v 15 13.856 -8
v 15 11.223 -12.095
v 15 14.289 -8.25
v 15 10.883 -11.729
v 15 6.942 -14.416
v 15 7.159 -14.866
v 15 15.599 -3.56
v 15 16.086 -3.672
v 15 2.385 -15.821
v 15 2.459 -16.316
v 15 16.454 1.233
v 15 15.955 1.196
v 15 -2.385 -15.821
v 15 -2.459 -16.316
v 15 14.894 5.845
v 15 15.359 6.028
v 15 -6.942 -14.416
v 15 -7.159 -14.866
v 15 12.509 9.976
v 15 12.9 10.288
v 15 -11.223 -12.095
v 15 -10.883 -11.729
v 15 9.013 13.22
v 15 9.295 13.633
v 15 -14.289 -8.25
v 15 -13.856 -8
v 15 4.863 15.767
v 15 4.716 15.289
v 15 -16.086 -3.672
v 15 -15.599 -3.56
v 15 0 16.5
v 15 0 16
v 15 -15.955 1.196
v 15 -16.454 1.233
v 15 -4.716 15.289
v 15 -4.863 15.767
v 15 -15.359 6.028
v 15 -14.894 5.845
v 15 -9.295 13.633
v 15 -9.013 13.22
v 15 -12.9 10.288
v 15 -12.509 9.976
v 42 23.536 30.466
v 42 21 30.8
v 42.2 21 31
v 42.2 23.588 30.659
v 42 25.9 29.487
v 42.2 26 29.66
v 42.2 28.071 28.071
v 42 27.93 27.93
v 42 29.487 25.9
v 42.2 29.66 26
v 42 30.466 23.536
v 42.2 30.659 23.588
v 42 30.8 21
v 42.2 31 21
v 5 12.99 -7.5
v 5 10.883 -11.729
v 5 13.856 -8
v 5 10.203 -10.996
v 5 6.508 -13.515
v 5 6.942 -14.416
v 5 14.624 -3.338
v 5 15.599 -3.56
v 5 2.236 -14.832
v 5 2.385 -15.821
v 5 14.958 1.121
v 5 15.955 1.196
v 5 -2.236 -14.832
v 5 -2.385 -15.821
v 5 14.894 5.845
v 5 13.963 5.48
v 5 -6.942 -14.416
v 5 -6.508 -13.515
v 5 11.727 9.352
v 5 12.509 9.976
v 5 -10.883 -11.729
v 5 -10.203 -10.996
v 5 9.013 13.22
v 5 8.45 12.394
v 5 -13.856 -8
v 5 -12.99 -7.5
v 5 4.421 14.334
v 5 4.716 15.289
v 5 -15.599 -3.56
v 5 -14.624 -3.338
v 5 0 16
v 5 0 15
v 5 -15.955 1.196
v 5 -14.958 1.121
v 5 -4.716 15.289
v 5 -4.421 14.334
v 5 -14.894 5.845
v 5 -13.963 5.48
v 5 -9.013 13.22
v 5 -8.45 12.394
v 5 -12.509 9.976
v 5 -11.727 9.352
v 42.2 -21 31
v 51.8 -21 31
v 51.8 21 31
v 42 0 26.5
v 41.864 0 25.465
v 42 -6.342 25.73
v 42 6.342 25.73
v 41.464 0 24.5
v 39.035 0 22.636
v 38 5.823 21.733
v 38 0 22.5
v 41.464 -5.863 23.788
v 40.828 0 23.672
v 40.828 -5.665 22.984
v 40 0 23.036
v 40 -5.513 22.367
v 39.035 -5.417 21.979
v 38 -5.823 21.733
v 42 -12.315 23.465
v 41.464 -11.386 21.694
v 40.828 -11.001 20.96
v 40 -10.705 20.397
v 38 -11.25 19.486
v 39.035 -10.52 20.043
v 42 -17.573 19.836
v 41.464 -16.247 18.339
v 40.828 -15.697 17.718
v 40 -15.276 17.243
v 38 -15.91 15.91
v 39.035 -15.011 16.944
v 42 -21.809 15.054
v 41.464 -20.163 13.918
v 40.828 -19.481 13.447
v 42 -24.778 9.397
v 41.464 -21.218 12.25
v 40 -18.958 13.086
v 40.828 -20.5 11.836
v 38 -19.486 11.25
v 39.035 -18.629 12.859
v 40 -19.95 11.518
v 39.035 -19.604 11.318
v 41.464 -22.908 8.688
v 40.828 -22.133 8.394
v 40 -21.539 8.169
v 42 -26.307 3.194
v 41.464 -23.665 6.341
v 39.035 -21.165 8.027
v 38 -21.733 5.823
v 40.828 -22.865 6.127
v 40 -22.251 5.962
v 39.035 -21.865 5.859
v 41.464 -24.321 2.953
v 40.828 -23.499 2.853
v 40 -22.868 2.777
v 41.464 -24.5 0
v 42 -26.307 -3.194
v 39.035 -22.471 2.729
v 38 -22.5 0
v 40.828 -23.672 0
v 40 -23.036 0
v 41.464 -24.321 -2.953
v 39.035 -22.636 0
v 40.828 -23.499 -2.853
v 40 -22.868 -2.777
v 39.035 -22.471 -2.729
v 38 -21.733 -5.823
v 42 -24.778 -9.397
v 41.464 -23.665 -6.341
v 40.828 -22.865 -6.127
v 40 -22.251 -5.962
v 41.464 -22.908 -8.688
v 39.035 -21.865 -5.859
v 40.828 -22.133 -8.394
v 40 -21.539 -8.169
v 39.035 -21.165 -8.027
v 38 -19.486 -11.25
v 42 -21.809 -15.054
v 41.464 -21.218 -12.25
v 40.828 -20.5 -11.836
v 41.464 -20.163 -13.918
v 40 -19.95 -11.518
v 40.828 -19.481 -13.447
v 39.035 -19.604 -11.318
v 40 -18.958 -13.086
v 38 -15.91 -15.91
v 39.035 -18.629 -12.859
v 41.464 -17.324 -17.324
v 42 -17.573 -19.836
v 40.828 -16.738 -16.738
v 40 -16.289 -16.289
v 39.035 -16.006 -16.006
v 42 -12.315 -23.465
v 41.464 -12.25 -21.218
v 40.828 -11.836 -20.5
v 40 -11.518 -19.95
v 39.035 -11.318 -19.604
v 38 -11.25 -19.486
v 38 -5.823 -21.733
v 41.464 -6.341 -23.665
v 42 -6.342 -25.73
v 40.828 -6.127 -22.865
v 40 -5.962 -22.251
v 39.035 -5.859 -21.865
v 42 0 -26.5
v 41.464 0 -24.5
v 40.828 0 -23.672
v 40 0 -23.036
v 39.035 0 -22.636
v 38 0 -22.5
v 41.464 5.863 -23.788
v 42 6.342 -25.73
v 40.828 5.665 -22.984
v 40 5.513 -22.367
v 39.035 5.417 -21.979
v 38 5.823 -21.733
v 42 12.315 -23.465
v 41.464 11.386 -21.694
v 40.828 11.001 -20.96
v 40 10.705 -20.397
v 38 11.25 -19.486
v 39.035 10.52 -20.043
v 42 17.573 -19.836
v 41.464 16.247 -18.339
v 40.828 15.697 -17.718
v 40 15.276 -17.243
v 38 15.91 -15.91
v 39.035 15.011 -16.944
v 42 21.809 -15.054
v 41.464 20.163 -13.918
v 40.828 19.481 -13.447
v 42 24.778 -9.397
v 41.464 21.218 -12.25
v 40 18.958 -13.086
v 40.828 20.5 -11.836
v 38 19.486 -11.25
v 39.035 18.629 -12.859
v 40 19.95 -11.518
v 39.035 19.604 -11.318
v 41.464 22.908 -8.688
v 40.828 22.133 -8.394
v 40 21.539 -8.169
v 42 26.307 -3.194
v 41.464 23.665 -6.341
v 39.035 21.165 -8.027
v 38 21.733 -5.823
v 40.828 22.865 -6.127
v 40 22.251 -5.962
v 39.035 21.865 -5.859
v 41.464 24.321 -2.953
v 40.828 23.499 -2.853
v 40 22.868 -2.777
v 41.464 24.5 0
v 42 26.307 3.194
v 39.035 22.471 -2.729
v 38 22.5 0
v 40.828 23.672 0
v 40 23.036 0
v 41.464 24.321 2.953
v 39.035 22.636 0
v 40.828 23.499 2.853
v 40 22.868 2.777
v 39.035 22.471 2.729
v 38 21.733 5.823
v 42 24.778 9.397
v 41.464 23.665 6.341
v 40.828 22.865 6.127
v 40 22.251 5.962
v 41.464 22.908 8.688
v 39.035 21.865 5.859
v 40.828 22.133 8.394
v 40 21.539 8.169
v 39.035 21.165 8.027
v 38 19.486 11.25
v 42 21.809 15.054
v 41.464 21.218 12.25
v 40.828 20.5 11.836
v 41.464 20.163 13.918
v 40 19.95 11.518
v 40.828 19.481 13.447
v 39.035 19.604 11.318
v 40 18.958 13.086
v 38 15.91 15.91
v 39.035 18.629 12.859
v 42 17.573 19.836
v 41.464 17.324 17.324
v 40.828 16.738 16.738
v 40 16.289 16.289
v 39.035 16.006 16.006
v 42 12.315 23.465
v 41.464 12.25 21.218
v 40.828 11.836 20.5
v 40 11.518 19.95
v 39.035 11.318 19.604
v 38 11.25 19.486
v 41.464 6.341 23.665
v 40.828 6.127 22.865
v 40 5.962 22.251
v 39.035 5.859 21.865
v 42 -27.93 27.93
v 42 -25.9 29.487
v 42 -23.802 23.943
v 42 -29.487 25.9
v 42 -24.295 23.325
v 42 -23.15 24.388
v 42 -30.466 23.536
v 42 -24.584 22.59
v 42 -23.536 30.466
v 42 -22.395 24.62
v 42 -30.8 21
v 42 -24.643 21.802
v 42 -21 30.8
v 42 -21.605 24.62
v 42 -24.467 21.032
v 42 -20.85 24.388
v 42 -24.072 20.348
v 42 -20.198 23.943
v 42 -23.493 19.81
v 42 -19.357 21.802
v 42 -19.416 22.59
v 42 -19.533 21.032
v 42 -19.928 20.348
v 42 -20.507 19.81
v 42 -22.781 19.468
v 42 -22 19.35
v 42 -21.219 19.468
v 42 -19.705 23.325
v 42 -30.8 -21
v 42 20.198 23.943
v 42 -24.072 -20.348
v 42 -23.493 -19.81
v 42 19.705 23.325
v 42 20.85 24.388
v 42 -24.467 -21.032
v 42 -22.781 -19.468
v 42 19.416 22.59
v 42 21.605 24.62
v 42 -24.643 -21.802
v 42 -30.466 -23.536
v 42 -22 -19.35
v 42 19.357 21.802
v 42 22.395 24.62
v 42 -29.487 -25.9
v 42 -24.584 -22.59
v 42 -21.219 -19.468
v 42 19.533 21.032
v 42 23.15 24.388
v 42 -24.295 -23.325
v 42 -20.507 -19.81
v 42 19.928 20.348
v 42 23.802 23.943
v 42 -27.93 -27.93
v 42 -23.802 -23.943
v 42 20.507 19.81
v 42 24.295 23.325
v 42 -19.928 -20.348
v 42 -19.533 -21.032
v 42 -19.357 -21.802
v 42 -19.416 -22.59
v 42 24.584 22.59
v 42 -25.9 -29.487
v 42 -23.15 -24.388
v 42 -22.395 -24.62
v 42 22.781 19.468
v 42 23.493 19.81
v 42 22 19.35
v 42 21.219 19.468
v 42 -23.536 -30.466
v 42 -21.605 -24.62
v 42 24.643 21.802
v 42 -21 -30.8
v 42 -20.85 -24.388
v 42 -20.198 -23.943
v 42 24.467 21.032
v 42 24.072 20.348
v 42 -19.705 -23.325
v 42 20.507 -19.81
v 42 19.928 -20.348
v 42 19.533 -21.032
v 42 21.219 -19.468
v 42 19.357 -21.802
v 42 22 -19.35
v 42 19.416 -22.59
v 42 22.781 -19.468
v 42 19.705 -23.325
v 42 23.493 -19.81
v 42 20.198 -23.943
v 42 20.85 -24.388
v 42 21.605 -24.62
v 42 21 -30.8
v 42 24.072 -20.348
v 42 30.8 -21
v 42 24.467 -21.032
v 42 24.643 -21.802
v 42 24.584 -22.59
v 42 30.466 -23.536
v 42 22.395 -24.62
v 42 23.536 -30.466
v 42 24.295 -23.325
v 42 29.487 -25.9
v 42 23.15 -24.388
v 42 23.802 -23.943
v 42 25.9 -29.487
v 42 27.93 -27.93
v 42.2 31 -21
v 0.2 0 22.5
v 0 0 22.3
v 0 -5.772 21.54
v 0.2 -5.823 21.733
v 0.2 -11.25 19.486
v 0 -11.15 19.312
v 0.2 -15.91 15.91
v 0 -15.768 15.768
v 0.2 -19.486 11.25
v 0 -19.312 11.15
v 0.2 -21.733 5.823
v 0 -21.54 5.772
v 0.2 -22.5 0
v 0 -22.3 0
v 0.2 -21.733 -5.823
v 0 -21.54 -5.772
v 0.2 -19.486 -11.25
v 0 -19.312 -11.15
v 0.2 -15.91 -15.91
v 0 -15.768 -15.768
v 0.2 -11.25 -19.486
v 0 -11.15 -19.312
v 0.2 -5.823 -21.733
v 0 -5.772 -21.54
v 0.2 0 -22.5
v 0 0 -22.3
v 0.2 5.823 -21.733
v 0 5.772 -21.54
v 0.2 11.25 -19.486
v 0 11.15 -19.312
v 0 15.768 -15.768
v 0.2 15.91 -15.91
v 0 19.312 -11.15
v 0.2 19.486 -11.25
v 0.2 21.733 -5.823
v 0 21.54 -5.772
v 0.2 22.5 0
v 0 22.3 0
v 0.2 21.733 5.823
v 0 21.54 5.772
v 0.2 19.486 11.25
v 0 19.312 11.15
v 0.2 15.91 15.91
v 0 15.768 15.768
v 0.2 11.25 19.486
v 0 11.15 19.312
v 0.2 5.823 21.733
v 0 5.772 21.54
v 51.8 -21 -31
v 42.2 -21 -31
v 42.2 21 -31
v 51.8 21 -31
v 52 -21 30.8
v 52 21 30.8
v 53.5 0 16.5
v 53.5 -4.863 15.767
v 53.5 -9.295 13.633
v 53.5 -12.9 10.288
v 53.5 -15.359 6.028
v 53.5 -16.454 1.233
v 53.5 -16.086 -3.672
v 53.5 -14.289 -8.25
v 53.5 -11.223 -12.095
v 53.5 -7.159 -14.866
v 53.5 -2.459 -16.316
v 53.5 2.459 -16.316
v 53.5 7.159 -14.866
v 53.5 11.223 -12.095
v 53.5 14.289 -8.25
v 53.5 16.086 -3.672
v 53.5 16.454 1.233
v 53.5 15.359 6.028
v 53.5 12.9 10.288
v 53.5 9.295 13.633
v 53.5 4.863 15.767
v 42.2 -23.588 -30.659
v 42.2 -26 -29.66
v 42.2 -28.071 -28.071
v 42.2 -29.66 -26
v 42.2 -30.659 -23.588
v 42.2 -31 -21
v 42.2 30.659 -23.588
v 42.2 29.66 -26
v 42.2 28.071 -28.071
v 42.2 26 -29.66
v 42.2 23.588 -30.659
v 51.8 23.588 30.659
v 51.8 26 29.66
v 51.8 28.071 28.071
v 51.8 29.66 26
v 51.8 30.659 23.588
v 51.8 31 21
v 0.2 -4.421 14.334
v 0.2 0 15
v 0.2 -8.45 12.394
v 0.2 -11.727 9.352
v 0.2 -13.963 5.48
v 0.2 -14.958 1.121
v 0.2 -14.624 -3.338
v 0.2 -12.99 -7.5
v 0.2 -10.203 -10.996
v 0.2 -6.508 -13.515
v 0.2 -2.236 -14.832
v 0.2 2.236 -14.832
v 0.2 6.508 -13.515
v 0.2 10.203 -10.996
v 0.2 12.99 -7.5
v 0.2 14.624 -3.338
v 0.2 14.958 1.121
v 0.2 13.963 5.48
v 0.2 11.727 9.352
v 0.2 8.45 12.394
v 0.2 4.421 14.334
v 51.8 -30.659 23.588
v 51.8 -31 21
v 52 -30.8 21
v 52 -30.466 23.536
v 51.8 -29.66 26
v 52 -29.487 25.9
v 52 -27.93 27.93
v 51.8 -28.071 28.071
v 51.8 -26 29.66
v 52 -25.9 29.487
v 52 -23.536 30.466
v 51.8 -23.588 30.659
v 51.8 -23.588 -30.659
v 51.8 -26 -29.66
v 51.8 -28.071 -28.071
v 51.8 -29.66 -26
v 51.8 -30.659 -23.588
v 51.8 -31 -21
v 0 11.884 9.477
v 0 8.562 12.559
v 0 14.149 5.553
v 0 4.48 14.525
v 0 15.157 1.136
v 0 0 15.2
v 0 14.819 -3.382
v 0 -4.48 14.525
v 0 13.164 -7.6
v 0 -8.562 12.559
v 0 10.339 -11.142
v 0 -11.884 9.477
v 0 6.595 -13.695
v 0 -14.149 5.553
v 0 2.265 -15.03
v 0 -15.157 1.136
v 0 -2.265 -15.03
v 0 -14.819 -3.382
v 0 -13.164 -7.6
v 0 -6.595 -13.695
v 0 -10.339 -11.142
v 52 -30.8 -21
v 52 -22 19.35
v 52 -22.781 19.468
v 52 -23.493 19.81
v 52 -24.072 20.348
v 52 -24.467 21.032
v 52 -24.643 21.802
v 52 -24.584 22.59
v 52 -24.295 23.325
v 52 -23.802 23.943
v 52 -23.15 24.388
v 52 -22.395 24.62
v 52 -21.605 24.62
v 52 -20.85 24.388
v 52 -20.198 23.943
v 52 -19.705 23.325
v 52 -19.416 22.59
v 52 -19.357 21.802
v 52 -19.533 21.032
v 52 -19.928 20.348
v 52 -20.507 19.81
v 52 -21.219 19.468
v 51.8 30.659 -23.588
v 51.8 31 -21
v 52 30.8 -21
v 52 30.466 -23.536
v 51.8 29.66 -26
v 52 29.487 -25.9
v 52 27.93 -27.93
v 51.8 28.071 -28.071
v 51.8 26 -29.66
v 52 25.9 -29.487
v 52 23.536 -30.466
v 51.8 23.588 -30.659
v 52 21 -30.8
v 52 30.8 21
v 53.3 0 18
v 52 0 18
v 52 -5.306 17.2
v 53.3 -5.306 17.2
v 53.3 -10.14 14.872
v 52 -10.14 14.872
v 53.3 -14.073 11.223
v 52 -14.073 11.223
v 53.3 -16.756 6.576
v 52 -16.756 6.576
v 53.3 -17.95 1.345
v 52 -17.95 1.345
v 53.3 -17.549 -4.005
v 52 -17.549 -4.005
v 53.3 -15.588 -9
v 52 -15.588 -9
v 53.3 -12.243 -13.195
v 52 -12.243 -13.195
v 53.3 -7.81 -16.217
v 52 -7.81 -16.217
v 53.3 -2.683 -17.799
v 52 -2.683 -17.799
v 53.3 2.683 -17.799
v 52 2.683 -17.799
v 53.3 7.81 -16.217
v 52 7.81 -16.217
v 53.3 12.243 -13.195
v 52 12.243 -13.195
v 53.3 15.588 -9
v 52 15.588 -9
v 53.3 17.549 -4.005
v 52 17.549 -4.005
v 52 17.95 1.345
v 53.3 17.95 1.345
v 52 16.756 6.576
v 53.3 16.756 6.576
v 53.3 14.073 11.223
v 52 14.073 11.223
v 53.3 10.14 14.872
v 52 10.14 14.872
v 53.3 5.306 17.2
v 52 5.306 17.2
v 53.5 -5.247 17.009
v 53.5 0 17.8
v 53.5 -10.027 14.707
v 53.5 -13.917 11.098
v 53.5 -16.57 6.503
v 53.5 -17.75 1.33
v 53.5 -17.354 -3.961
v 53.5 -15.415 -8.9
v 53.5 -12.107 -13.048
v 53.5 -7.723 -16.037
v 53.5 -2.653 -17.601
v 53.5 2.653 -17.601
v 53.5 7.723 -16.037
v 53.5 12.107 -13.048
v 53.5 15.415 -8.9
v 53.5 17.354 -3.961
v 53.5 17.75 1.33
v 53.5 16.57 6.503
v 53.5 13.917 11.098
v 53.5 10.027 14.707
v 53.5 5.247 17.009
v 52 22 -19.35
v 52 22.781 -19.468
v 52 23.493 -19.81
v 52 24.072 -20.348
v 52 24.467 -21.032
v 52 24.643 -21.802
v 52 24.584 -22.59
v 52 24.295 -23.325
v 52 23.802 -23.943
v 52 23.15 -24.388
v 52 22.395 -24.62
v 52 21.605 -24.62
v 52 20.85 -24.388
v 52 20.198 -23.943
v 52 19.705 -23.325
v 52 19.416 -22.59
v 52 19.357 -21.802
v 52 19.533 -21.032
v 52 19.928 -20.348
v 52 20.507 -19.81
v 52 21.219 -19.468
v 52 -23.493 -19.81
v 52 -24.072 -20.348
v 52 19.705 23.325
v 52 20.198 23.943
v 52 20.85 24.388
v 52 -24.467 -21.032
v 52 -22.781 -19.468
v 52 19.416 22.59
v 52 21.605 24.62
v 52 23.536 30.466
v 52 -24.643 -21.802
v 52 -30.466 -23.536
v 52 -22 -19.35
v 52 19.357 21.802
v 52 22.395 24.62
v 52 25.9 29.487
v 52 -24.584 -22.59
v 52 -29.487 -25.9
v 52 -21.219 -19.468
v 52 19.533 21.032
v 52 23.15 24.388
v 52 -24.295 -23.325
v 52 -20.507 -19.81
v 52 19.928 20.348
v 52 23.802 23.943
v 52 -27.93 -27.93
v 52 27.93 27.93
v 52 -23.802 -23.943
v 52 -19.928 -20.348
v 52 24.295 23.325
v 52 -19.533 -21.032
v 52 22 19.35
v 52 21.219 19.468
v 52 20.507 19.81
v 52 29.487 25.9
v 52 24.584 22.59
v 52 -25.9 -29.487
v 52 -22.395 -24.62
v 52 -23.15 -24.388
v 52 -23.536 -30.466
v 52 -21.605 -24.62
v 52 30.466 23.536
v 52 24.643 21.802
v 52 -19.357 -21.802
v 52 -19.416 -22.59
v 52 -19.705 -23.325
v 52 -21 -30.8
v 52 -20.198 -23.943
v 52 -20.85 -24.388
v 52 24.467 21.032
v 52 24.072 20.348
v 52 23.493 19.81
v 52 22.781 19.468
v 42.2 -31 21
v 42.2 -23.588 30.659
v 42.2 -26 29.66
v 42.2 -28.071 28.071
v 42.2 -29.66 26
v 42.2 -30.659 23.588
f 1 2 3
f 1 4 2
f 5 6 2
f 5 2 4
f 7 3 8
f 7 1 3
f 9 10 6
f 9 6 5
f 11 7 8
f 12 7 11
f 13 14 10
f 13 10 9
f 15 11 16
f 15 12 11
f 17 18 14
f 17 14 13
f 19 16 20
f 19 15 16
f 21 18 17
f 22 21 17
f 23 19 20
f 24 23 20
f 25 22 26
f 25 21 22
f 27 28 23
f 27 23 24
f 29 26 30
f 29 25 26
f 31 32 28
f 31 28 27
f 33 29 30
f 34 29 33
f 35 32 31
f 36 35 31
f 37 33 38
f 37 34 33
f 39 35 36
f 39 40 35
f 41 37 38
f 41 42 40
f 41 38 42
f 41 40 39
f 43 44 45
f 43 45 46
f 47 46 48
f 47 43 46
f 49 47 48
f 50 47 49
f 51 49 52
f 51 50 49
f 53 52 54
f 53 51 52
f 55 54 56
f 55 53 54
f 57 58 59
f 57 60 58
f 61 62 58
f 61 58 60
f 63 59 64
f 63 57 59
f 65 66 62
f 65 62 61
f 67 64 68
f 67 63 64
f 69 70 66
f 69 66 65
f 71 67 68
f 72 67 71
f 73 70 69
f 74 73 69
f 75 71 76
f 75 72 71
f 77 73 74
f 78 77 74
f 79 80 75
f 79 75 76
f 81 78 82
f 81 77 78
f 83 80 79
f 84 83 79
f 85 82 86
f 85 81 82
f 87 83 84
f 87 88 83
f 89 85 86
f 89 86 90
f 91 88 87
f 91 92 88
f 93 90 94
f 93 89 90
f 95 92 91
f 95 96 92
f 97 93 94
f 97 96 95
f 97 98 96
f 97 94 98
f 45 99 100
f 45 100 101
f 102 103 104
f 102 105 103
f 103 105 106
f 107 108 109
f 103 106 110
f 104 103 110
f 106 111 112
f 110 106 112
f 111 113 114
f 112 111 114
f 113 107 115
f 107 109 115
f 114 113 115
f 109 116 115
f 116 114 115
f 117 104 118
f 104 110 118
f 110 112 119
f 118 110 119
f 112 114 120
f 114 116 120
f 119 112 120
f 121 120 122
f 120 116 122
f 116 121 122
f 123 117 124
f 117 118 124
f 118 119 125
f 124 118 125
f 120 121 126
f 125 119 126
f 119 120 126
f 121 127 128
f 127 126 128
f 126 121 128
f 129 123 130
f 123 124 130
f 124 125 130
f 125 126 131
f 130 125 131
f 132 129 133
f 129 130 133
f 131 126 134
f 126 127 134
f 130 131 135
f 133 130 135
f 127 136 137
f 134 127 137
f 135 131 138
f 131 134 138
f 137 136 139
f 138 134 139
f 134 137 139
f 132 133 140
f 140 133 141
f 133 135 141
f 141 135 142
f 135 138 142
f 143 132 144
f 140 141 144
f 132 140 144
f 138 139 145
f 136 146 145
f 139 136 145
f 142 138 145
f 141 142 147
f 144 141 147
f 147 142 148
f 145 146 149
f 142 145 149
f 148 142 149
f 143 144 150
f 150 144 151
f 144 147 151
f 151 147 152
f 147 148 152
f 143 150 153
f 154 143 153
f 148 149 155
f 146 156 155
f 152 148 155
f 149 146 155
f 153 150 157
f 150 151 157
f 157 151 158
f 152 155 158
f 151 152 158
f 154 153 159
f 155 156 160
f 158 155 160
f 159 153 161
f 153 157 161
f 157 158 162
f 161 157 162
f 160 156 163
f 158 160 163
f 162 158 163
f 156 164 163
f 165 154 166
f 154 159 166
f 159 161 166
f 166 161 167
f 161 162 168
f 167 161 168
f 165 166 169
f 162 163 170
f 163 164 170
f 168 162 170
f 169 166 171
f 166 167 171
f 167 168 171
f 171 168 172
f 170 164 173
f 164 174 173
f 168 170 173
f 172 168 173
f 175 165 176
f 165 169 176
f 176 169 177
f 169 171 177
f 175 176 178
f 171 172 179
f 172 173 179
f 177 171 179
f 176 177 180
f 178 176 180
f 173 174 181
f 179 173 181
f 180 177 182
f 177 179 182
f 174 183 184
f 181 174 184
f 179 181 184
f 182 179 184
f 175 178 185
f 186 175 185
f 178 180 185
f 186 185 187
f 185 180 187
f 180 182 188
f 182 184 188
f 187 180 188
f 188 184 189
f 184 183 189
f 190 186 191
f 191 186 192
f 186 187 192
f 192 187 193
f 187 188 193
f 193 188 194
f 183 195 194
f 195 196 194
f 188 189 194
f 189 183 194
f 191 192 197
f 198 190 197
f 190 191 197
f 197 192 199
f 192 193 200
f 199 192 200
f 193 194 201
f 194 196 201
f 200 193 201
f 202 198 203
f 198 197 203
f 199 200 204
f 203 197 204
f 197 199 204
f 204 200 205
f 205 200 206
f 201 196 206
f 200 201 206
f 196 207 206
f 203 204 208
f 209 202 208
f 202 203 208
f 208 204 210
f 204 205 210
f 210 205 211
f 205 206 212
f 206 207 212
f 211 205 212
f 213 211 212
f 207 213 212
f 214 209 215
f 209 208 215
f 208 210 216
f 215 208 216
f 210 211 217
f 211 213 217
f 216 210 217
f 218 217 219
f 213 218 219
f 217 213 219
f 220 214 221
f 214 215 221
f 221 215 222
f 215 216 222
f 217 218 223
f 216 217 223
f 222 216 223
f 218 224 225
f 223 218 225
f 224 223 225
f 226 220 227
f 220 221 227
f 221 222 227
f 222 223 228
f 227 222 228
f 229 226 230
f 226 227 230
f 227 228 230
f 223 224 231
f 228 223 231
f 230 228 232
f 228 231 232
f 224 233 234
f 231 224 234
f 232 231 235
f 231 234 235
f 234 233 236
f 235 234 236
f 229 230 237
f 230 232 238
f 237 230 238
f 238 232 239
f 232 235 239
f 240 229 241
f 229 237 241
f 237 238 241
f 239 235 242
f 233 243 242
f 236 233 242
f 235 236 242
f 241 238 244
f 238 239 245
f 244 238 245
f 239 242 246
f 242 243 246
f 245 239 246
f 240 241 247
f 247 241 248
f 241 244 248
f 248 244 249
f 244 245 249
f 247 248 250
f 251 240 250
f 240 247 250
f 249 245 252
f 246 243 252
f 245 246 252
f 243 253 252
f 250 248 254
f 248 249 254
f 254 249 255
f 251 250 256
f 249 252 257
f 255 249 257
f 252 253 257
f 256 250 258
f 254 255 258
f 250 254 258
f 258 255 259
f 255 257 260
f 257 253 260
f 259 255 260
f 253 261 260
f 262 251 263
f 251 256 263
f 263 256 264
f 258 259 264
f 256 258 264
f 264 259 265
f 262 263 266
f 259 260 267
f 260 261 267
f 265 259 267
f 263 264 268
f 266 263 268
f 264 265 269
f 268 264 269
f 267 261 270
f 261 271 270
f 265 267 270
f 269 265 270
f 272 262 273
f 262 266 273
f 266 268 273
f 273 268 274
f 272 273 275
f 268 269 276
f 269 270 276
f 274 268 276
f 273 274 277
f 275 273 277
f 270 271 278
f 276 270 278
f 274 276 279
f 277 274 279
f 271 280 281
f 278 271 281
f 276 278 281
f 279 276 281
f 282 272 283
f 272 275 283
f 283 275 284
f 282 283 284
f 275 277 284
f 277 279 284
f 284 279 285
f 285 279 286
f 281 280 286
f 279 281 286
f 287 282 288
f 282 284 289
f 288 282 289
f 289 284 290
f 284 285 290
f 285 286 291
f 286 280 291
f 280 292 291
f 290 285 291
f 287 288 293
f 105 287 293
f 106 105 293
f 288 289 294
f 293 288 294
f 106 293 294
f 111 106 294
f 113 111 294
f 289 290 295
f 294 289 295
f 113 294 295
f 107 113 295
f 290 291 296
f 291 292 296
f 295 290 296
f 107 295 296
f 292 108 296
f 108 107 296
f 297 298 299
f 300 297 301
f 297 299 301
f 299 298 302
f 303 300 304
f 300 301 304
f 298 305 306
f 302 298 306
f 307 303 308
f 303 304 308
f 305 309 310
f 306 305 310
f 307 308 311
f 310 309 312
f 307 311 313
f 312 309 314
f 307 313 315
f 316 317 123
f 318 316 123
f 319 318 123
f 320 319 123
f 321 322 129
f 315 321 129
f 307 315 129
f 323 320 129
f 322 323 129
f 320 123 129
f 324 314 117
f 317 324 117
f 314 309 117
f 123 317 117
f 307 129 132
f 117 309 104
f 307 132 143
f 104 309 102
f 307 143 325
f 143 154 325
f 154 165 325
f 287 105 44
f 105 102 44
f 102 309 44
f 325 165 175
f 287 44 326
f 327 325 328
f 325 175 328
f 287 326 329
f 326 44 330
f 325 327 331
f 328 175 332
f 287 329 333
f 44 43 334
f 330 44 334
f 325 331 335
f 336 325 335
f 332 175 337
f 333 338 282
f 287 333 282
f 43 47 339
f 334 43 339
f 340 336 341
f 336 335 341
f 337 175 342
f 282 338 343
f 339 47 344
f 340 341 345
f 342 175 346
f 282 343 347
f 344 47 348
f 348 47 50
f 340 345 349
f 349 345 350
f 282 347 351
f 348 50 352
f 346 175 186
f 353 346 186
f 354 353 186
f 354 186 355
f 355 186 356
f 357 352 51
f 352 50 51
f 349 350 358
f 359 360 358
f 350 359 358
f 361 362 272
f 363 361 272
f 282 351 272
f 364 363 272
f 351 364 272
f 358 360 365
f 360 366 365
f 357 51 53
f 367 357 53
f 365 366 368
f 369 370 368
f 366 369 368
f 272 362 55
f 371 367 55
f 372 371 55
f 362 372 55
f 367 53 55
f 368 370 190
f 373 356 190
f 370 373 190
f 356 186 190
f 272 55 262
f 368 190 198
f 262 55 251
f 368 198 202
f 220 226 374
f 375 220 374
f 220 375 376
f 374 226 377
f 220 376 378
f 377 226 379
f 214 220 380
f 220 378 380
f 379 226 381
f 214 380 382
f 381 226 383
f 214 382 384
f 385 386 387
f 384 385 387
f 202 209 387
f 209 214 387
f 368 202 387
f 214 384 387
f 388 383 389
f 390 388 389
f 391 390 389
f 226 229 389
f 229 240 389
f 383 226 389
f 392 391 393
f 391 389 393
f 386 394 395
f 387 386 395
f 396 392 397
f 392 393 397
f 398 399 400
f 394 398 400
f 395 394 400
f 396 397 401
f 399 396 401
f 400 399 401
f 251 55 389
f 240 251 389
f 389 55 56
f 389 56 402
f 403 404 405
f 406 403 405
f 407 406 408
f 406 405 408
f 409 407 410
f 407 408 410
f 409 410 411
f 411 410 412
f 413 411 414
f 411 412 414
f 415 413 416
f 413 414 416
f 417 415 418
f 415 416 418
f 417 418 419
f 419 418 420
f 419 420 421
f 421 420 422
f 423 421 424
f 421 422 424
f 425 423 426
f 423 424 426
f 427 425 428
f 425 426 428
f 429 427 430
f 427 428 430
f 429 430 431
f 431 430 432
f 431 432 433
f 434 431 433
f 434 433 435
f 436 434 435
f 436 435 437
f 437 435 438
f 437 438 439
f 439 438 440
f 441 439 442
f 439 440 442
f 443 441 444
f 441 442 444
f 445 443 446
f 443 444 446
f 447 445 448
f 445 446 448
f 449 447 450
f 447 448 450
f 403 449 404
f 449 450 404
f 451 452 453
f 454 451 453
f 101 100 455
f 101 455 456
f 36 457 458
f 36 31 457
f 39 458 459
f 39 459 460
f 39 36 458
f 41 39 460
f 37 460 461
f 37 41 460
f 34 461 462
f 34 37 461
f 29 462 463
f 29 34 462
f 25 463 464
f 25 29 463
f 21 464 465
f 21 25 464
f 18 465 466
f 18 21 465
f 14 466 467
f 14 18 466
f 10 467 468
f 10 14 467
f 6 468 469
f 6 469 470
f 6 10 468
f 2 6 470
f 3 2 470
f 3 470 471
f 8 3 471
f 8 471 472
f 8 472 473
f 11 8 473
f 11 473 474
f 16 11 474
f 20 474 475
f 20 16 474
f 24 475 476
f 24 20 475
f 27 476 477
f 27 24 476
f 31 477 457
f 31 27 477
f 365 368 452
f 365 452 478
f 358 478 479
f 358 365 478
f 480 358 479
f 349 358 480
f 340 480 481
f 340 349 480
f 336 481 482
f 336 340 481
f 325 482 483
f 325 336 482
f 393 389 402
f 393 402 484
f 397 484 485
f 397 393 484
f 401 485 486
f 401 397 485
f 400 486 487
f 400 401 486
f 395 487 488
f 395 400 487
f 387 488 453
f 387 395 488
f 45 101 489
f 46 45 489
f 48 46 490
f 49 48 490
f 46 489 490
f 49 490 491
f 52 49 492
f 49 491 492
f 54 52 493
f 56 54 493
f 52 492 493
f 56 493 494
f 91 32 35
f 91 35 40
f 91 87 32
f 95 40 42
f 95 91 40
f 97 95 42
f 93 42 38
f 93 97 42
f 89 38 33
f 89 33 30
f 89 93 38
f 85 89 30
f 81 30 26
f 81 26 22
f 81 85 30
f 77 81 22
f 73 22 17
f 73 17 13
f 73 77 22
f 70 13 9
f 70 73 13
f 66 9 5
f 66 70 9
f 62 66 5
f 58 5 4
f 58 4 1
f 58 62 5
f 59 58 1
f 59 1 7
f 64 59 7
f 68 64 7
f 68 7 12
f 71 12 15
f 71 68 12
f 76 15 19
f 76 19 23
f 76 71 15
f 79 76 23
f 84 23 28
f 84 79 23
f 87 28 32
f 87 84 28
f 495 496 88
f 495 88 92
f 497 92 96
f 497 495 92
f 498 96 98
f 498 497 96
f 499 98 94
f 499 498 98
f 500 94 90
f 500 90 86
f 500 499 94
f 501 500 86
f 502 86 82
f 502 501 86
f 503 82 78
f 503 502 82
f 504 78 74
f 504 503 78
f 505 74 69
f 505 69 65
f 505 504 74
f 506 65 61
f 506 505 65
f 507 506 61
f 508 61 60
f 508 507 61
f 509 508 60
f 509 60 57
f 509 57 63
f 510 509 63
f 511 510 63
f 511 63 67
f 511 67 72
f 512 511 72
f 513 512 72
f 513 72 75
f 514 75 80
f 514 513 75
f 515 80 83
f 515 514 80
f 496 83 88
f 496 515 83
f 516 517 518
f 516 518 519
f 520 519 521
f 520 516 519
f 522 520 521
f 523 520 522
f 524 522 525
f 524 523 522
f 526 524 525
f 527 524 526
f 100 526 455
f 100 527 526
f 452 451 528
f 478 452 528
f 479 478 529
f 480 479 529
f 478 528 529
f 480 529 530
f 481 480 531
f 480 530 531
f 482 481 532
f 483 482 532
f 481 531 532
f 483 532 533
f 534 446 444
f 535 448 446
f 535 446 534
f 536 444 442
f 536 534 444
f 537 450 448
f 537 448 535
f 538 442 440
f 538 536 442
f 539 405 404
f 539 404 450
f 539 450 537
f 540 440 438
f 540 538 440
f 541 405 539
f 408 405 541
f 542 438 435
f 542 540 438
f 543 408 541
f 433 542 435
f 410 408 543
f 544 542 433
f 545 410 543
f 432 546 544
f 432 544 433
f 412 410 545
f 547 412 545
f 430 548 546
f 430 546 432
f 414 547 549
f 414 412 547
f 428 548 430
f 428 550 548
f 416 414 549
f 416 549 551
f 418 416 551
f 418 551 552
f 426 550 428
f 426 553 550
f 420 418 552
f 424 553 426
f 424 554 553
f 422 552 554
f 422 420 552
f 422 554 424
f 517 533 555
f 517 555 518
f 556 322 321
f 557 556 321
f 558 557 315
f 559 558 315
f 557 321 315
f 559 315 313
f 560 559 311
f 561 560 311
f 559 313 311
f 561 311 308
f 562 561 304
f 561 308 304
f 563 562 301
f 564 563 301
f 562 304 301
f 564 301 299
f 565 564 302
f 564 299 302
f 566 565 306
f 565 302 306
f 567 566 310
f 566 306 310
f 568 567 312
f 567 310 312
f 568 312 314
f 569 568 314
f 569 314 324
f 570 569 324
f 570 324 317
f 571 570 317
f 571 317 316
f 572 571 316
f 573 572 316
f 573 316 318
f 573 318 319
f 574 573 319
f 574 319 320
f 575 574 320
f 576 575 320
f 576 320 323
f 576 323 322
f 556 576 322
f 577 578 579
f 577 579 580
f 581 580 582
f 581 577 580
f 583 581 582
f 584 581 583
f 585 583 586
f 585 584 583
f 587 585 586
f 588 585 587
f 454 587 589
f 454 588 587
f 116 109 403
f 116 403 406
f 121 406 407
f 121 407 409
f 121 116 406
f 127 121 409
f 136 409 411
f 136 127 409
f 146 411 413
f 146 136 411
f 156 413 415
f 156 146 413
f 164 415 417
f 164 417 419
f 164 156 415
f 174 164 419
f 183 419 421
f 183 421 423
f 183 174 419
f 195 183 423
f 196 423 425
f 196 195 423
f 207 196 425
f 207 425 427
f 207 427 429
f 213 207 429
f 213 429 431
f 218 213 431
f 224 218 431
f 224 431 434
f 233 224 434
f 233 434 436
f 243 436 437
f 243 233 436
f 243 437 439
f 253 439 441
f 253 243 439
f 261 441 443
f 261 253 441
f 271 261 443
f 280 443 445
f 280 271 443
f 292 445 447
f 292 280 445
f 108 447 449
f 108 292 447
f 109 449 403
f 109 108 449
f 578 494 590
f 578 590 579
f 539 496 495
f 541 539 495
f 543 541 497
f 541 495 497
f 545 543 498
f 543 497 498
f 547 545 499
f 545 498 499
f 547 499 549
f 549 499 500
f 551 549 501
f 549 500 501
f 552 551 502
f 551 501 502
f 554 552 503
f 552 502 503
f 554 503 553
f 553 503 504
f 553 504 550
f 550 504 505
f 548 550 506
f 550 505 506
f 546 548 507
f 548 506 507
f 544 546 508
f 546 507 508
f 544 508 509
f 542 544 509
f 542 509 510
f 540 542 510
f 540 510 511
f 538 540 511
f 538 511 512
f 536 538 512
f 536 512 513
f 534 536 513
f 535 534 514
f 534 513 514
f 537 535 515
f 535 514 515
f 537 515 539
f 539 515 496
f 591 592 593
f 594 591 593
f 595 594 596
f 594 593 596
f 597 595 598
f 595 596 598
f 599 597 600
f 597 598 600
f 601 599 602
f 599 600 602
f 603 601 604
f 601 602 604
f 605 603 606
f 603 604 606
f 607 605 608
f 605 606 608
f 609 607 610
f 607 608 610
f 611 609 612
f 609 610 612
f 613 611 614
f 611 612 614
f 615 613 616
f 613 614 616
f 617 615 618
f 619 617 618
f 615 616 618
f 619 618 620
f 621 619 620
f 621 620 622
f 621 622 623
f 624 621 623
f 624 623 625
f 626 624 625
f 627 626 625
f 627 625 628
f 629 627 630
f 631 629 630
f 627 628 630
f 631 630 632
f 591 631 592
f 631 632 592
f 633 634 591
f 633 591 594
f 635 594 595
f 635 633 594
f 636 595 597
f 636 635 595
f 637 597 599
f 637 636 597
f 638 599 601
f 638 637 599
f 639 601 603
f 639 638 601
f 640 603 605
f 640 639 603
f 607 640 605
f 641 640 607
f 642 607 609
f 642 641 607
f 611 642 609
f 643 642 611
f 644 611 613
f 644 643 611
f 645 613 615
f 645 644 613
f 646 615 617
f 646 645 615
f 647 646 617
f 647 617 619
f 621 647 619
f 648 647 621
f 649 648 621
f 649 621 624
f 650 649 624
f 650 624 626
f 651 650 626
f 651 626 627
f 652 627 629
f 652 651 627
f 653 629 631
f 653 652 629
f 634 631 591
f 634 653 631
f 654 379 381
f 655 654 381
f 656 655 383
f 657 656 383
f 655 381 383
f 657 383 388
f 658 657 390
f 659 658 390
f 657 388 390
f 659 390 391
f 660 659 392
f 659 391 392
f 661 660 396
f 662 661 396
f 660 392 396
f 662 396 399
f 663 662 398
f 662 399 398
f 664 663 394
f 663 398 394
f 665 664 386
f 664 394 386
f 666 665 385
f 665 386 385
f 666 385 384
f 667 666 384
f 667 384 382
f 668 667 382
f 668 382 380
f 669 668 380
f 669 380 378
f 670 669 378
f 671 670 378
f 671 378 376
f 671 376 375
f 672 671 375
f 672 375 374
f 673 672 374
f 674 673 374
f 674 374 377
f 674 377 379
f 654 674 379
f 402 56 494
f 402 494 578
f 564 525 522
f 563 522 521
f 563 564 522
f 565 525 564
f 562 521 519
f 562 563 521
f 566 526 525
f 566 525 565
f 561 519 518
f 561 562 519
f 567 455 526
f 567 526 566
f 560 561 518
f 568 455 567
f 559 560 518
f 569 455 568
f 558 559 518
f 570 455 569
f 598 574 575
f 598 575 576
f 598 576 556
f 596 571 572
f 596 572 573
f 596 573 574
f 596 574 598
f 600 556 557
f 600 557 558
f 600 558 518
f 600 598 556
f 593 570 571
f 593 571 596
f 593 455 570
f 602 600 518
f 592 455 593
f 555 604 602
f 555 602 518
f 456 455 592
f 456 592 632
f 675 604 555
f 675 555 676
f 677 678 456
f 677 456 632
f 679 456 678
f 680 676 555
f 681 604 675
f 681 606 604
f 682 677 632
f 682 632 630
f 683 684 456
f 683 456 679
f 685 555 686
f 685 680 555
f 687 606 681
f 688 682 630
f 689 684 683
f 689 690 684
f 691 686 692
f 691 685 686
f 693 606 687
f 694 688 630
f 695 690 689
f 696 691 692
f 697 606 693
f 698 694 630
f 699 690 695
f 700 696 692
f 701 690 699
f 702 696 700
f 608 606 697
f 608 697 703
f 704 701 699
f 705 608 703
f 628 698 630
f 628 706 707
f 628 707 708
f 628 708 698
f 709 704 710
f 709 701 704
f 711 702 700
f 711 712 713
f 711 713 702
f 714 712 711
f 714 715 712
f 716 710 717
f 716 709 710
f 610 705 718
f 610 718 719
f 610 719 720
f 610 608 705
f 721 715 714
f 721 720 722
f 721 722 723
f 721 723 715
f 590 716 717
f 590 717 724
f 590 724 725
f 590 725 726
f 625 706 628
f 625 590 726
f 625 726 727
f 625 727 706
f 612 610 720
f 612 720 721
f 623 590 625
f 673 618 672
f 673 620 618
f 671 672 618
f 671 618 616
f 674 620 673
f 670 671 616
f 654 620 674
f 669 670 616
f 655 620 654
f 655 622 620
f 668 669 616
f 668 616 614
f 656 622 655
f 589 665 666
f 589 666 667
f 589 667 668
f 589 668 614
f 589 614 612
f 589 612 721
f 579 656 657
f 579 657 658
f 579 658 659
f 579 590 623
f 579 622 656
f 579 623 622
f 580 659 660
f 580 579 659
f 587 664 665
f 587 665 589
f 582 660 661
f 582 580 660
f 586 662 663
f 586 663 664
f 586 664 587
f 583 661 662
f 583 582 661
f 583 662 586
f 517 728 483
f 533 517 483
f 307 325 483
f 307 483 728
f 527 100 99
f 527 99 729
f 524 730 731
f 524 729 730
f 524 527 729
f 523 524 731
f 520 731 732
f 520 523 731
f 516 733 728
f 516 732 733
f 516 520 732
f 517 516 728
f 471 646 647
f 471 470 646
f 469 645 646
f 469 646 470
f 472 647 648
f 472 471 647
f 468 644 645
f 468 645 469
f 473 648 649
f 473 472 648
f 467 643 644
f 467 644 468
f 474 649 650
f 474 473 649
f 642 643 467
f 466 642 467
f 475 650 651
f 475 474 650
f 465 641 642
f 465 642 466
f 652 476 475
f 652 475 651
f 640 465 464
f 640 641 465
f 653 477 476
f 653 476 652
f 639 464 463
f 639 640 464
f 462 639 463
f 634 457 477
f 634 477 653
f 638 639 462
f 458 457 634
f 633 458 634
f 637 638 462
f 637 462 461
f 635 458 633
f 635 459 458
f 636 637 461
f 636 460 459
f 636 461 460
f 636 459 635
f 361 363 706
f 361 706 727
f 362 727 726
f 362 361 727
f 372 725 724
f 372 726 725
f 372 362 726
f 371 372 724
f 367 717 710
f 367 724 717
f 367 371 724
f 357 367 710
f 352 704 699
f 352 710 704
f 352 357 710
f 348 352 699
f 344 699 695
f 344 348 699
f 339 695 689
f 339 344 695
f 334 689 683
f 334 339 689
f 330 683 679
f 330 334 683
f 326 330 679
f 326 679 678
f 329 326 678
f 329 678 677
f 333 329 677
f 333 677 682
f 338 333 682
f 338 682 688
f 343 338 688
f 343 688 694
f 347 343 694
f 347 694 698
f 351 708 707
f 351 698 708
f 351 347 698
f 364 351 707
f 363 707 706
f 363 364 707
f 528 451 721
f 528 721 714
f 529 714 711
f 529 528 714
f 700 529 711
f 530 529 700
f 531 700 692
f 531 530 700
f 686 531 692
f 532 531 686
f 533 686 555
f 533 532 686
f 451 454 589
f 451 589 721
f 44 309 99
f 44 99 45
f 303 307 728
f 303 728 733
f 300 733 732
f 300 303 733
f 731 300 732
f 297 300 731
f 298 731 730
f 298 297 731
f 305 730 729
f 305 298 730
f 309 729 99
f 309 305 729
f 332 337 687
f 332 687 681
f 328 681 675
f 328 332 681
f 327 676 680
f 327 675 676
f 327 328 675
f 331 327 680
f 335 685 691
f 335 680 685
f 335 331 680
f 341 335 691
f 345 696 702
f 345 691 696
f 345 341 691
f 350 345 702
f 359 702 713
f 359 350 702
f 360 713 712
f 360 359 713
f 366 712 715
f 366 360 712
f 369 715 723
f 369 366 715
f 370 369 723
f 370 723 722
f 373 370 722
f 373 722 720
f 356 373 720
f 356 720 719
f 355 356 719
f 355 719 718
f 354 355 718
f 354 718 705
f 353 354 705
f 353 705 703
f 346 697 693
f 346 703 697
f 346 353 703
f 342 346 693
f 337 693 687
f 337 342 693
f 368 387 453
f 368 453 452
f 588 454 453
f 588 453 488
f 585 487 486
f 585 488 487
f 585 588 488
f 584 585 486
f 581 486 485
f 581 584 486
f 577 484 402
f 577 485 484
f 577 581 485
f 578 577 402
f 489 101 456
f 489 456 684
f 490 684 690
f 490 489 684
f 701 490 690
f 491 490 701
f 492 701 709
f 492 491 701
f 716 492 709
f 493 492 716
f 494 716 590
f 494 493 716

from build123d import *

# Parameters (mm, degrees)
BOSS_EXTRU_1_START = -10
ESQUISSE2_W        = 62
ESQUISSE2_H        = 62
ESQUISSE2_R        = 16.5
BOSS_EXTRU_1_DEPTH = 10
CONG_1_R           = 10
D_GAGEMENT_M51_D   = 5.3
SYM_TRIE2_COPY_1_D = 5.3
CONG_2_R           = 4
ESQUISSE5_R        = 18
ESQUISSE5_R_2      = 16.5
BOSS_EXTRU_2_DEPTH = 1.5
CHANFREIN1_SIZE    = 0.2
CHANFREIN2_SIZE    = 0.2
CHANFREIN3_SIZE    = 0.2
CHANFREIN4_SIZE    = 0.2


with BuildPart() as part:
    # Esquisse1 → Révolution1 (revolve)
    with BuildSketch(Plane.XY, mode=Mode.PRIVATE) as r_volution1_sk:
        Polygon((0, 15), (0, 22.5), (52, 22.5), (52, 16.5), (15, 16.5), (15, 16), (5, 16), (5, 15), align=None)
    revolve(r_volution1_sk.sketch.rotate(Axis((-138.831140815, 0, 0), (1, 0, 0)), 90), axis=Axis((-138.831140815, 0, 0), (1, 0, 0)))

    # Esquisse2 → Boss.-Extru.1 (add)
    with BuildSketch(Plane(origin=(52, 0, 0), x_dir=(0, 0, -1), z_dir=(1, 0, 0)).offset(BOSS_EXTRU_1_START)):
        Rectangle(ESQUISSE2_W, ESQUISSE2_H)
        with Locations(Location((0, 0, 0), (0, 0, 180))):
            Circle(ESQUISSE2_R, mode=Mode.SUBTRACT)
    extrude(amount=BOSS_EXTRU_1_DEPTH)

    # Congé1
    cong_1_edges = [part.edges().sort_by_distance(p)[0] for p in [
        (47, 31, -31),
        (47, -31, -31),
        (47, -31, 31),
        (47, 31, 31),
    ]]
    fillet(cong_1_edges, radius=CONG_1_R)

    # Dégagement M51 (through all)
    with Locations(Plane(origin=(52, 0, 0), x_dir=(0, 0, -1), z_dir=(1, 0, 0))):
        with Locations((22, 22)):
            d_gagement_m51 = Hole(D_GAGEMENT_M51_D / 2)

    # Symétrie1: Dégagement M51 across plane
    add(d_gagement_m51.mirror(Plane.XY), mode=Mode.SUBTRACT)

    # Symétrie2: Dégagement M51 across plane
    add(d_gagement_m51.mirror(Plane.ZX), mode=Mode.SUBTRACT)

    # Symétrie2 copy 1 (through all)
    with Locations(Plane(origin=(52, 0, 0), x_dir=(0, 0, 1), z_dir=(1, 0, 0))):
        with Locations((22, 22)):
            Hole(SYM_TRIE2_COPY_1_D / 2)

    # Congé2
    cong_2_edges = [part.edges().sort_by_distance(p)[0] for p in [
        (42, 0, -22.5),
    ]]
    fillet(cong_2_edges, radius=CONG_2_R)

    # Esquisse5 → Boss.-Extru.2 (add)
    with BuildSketch(Plane(origin=(52, 0, 0), x_dir=(0, 0, -1), z_dir=(1, 0, 0))):
        with Locations(Location((0, 0, 0), (0, 0, 180))):
            Circle(ESQUISSE5_R)
        with Locations(Location((0, 0, 0), (0, 0, 180))):
            Circle(ESQUISSE5_R_2, mode=Mode.SUBTRACT)
    extrude(amount=BOSS_EXTRU_2_DEPTH)

    # Chanfrein1
    chanfrein1_edges = [part.edges().sort_by_distance(p)[0] for p in [
        (53.5, 0, -18),
    ]]
    chamfer(chanfrein1_edges, length=CHANFREIN1_SIZE)

    # Chanfrein2
    chanfrein2_edges = [part.edges().sort_by_distance(p)[0] for p in [
        (52, 0, 31),
        (52, 0, -31),
        (52, 31, 0),
        (52, -31, 0),
        (52, 28.071067812, 28.071067812),
        (52, 28.071067812, -28.071067812),
        (52, -28.071067812, -28.071067812),
        (52, -28.071067812, 28.071067812),
    ]]
    chamfer(chanfrein2_edges, length=CHANFREIN2_SIZE)

    # Chanfrein3
    chanfrein3_edges = [part.edges().sort_by_distance(p)[0] for p in [
        (42, 0, 31),
        (42, -31, 0),
        (42, 0, -31),
        (42, 31, 0),
        (42, 28.071067812, 28.071067812),
        (42, 28.071067812, -28.071067812),
        (42, -28.071067812, -28.071067812),
        (42, -28.071067812, 28.071067812),
    ]]
    chamfer(chanfrein3_edges, length=CHANFREIN3_SIZE)

    # Chanfrein4
    chanfrein4_edges = [part.edges().sort_by_distance(p)[0] for p in [
        (0, 0, -15),
        (0, 0, -22.5),
    ]]
    chamfer(chanfrein4_edges, length=CHANFREIN4_SIZE)


solid = part.part
